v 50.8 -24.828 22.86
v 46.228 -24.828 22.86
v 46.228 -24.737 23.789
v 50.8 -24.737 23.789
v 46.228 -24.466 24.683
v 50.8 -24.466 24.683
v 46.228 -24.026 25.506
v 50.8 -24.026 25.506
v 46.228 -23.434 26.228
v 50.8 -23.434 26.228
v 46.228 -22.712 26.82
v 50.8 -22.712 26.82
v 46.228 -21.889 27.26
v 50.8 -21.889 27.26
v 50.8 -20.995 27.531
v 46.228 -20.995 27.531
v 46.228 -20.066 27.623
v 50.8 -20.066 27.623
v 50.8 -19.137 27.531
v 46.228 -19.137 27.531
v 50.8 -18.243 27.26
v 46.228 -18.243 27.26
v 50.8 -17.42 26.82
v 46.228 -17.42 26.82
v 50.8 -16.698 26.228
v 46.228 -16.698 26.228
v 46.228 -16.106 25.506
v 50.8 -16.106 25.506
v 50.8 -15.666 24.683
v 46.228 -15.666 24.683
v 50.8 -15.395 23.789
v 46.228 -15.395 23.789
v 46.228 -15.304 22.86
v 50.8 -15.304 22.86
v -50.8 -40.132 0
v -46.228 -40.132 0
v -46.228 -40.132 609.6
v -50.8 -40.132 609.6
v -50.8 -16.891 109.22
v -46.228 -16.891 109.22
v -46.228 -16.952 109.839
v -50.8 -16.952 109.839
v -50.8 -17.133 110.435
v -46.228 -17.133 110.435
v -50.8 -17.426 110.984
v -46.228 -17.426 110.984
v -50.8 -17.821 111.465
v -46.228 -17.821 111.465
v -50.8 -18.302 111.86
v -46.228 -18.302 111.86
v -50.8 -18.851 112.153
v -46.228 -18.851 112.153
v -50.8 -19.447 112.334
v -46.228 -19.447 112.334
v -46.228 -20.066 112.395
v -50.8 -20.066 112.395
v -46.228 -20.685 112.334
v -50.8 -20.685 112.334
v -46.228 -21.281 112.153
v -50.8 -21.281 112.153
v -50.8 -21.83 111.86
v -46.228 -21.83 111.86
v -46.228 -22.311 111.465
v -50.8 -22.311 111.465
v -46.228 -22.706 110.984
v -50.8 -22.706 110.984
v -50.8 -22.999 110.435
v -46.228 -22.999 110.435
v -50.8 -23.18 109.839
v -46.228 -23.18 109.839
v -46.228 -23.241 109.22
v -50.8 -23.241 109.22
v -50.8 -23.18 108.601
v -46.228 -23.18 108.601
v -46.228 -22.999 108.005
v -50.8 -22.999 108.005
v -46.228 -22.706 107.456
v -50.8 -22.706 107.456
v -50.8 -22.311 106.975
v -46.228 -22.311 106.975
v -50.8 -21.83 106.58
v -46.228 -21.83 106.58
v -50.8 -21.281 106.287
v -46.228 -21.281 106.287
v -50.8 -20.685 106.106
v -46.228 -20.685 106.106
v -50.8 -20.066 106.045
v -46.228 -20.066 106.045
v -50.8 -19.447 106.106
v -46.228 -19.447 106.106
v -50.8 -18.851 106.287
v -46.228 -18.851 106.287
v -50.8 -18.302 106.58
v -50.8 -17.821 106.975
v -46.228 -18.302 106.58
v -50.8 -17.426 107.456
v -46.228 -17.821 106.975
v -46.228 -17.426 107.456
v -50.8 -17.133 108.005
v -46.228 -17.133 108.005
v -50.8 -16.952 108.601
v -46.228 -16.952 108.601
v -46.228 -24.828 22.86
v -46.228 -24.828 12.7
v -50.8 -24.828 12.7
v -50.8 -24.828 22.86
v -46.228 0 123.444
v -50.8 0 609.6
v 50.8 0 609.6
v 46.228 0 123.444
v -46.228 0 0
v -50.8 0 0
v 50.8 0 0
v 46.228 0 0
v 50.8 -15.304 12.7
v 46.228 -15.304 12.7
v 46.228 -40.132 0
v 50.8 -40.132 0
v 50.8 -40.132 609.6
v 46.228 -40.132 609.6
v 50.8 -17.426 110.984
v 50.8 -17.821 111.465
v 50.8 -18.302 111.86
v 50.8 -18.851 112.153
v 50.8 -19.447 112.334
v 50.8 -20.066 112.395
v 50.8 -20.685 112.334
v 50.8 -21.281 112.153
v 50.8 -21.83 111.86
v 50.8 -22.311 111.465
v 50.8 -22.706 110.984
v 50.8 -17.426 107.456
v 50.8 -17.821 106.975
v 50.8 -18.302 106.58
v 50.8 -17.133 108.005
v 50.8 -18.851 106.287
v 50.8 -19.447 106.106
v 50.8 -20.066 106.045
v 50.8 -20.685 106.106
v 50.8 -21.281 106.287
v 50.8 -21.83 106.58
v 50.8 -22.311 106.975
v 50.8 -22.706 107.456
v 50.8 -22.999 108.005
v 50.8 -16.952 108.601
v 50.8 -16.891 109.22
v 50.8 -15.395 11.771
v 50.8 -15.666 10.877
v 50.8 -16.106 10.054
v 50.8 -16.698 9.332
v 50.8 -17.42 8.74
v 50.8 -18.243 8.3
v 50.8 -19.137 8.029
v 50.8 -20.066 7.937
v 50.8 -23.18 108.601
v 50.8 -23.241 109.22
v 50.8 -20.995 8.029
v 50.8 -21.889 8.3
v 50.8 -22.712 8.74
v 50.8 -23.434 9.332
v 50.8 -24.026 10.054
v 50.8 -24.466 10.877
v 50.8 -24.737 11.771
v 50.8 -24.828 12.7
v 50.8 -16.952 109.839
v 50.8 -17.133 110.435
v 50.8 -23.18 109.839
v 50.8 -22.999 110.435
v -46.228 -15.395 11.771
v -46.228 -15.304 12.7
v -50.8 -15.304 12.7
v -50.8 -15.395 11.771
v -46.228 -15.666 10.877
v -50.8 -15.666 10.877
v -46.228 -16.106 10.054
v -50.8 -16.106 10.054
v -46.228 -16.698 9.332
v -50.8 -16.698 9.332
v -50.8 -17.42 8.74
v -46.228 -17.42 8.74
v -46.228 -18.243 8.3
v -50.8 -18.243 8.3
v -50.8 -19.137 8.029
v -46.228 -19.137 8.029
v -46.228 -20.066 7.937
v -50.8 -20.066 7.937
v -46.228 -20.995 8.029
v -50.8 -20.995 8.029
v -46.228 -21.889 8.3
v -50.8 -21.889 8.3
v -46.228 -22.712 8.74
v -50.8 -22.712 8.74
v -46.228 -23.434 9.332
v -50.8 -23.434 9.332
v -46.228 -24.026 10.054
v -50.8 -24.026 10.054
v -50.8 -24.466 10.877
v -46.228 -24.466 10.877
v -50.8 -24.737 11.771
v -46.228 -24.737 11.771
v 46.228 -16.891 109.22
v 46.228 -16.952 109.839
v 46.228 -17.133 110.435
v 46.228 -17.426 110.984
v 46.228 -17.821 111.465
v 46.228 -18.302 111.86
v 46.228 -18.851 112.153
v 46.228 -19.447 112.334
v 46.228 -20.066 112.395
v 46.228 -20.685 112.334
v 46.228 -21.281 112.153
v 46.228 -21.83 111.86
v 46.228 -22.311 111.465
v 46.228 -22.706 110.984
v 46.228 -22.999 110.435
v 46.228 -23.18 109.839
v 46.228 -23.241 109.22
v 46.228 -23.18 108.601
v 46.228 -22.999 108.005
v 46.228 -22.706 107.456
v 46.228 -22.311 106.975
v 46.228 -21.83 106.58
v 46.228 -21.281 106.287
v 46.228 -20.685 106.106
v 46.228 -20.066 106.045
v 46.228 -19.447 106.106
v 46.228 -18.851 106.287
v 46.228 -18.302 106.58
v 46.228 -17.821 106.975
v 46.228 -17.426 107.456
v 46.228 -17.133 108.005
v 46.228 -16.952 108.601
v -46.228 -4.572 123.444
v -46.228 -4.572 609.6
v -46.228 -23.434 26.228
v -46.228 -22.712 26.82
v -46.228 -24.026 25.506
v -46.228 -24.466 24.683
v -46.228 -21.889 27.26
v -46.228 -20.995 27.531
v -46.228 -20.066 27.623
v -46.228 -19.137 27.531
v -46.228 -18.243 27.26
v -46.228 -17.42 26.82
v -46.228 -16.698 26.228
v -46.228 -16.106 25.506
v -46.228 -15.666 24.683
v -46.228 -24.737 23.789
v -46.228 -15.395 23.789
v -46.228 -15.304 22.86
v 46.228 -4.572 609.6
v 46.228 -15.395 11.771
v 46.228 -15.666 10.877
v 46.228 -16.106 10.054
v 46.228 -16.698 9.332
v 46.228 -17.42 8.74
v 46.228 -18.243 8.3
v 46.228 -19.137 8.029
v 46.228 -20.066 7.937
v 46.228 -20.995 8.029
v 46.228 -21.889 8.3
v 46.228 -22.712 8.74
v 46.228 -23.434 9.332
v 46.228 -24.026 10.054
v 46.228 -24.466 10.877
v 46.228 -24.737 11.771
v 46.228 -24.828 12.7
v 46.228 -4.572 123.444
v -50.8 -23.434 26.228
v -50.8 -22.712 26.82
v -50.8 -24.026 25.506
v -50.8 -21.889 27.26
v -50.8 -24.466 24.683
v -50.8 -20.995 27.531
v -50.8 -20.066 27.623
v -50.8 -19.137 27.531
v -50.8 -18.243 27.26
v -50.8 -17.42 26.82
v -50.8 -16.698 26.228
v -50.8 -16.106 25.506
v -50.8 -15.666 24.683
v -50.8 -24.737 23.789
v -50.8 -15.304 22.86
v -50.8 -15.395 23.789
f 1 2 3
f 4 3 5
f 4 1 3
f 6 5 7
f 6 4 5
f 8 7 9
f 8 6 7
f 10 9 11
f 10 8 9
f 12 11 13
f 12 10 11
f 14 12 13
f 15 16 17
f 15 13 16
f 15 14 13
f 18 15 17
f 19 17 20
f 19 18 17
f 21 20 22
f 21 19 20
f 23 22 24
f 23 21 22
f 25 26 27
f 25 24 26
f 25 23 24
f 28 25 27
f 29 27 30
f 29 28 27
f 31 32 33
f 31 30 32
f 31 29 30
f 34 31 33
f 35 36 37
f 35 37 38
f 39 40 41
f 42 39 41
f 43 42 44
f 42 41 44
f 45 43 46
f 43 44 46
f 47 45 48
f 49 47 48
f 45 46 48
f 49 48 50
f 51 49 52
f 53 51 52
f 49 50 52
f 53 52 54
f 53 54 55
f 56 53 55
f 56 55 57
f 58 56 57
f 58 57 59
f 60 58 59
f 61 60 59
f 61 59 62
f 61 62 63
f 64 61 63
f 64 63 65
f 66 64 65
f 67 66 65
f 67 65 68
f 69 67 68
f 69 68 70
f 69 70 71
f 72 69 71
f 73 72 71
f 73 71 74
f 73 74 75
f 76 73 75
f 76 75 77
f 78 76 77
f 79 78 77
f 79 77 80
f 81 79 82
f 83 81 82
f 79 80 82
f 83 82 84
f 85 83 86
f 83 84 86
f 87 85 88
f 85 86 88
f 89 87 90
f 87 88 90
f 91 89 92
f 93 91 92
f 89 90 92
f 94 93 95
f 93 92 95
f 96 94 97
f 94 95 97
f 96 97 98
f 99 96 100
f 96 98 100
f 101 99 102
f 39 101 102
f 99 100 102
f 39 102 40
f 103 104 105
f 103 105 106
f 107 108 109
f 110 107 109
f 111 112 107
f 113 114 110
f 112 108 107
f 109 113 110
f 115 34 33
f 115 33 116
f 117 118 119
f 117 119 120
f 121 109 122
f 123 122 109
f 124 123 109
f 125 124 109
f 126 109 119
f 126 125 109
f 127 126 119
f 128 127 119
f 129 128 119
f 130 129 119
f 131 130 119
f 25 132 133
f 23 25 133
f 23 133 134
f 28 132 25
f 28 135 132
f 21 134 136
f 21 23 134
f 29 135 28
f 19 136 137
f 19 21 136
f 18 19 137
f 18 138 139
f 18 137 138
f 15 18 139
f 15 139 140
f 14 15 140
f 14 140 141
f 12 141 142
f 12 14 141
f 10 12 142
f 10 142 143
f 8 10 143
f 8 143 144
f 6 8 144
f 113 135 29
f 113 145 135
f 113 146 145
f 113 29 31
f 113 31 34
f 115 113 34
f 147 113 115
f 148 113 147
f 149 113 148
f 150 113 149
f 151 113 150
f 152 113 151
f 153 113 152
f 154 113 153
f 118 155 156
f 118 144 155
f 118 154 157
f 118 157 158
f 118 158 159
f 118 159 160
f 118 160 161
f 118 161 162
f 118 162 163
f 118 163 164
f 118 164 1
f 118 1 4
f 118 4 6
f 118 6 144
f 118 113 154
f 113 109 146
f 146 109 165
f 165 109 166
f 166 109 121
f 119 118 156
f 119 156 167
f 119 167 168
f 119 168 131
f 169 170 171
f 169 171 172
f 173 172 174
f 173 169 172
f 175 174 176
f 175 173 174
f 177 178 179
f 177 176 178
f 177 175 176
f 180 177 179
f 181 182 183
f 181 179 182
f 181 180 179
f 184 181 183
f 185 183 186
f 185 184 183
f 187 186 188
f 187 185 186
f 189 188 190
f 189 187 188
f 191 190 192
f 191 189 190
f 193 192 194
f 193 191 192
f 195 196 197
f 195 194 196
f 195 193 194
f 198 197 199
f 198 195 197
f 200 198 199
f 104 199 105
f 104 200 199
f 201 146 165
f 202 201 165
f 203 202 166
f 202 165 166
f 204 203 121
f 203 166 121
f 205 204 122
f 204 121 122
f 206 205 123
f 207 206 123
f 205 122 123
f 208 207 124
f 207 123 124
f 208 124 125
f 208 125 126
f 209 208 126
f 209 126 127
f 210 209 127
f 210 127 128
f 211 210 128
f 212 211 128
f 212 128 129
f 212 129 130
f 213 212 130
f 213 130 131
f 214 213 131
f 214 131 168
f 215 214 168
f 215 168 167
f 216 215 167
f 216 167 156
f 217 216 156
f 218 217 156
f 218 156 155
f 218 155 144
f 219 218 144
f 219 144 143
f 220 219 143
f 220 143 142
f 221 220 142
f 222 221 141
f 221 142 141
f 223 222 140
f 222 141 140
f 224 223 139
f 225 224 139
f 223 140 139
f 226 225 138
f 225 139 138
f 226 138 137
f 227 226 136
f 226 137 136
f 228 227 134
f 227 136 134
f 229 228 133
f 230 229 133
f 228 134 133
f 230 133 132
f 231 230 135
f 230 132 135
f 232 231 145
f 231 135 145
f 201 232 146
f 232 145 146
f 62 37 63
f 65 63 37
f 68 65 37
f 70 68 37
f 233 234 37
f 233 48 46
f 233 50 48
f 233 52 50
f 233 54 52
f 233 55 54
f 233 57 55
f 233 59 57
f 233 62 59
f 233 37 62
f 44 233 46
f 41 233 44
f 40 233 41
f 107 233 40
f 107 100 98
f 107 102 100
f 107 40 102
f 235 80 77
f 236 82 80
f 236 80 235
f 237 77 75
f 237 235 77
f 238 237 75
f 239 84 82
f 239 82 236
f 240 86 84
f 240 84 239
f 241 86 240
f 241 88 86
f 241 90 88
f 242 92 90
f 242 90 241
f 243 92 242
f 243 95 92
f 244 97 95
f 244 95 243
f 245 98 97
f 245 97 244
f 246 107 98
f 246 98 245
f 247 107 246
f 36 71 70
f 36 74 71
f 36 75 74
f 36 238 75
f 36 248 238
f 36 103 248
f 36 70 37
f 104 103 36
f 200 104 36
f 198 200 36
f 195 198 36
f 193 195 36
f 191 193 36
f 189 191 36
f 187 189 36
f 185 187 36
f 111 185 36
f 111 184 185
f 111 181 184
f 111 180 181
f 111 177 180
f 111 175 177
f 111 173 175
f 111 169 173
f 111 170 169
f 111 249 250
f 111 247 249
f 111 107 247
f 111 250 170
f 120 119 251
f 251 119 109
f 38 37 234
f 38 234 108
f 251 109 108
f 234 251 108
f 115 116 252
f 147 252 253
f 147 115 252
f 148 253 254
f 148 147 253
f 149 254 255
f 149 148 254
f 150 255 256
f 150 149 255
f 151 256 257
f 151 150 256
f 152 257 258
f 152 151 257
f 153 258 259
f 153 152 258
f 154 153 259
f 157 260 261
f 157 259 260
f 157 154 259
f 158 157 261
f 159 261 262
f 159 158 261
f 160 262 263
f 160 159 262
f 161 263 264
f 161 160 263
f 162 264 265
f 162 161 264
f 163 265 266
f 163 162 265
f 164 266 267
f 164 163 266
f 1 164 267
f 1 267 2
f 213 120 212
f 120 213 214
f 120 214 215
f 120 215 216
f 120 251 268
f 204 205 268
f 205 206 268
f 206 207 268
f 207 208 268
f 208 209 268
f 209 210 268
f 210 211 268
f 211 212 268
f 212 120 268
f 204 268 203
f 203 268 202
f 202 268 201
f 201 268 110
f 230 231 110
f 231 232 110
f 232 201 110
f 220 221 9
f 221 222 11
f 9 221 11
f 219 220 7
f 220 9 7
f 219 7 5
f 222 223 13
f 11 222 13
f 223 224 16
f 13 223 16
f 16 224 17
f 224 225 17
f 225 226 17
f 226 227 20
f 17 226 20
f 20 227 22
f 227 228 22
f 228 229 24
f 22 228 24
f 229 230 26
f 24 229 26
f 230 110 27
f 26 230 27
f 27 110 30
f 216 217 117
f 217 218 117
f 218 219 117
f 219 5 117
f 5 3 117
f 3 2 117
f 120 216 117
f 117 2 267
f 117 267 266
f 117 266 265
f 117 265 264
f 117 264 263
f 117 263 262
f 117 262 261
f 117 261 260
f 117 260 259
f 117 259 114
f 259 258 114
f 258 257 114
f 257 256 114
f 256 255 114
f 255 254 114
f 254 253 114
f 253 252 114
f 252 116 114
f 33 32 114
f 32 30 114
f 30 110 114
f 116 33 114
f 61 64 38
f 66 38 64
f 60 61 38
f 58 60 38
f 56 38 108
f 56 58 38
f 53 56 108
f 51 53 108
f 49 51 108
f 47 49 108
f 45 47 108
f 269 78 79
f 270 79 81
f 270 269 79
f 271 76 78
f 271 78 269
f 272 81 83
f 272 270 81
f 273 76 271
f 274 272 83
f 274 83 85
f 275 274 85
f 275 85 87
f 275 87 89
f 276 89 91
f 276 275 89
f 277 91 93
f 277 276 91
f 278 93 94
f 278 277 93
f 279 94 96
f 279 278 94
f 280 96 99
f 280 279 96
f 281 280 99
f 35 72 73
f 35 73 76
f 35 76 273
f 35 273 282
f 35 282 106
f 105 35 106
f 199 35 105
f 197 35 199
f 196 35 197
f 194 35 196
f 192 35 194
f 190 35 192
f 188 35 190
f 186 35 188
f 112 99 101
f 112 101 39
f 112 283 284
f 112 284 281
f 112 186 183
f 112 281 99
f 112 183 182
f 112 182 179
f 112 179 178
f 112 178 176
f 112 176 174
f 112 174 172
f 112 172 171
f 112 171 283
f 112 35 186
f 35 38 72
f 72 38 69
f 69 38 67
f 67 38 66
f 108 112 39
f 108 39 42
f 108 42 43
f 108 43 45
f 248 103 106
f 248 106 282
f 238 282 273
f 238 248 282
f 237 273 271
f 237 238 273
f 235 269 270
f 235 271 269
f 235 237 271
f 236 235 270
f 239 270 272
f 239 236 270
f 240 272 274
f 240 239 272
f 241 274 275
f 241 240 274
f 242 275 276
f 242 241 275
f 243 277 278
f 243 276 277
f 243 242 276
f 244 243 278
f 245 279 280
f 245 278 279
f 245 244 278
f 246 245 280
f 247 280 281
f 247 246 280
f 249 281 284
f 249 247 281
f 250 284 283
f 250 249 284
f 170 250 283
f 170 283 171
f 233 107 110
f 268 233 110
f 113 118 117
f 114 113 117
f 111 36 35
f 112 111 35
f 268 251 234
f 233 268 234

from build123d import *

# Parameters (mm, degrees)
BOSS_EXTRUDE1_DEPTH = 609.6
SKETCH3_W           = 92.456
SKETCH3_H           = 123.444
CUT_EXTRUDE1_DEPTH  = 614.028039672
SKETCH4_R           = 3.175
CUT_EXTRUDE2_DEPTH  = 620.310340156


with BuildPart() as part:
    # Sketch1 → Boss-Extrude1 (new body)
    with BuildSketch(Plane.XY):
        Polygon((-50.8, 0), (50.8, 0), (50.8, -40.132), (46.228, -40.132), (46.228, -4.572), (-46.228, -4.572), (-46.228, -40.132), (-50.8, -40.132), align=None)
    extrude(amount=BOSS_EXTRUDE1_DEPTH)

    # Sketch3 → Cut-Extrude1 (cut, through all)
    with BuildSketch(Plane(origin=(0, 0, 0), x_dir=(1, 0, 0), z_dir=(0, 1, 0))):
        with Locations((0, -61.722)):
            Rectangle(SKETCH3_W, SKETCH3_H)
    extrude(amount=-CUT_EXTRUDE1_DEPTH, mode=Mode.SUBTRACT)

    # Sketch4 → Cut-Extrude2 (cut, through all)
    with BuildSketch(Plane(origin=(50.8, 0, 0), x_dir=(0, 0, -1), z_dir=(1, 0, 0))):
        with Locations(Location((-109.22, -20.066, 0), (0, 0, 90))):
            Circle(SKETCH4_R)
        with BuildLine():
            Line((-12.7, -24.8285), (-22.86, -24.8285))
            ThreePointArc((-22.86, -24.8285), (-27.6225, -20.066), (-22.86, -15.3035))
            Line((-22.86, -15.3035), (-12.7, -15.3035))
            ThreePointArc((-12.7, -15.3035), (-7.9375, -20.066), (-12.7, -24.8285))
        make_face()
    extrude(amount=-CUT_EXTRUDE2_DEPTH, mode=Mode.SUBTRACT)


solid = part.part
